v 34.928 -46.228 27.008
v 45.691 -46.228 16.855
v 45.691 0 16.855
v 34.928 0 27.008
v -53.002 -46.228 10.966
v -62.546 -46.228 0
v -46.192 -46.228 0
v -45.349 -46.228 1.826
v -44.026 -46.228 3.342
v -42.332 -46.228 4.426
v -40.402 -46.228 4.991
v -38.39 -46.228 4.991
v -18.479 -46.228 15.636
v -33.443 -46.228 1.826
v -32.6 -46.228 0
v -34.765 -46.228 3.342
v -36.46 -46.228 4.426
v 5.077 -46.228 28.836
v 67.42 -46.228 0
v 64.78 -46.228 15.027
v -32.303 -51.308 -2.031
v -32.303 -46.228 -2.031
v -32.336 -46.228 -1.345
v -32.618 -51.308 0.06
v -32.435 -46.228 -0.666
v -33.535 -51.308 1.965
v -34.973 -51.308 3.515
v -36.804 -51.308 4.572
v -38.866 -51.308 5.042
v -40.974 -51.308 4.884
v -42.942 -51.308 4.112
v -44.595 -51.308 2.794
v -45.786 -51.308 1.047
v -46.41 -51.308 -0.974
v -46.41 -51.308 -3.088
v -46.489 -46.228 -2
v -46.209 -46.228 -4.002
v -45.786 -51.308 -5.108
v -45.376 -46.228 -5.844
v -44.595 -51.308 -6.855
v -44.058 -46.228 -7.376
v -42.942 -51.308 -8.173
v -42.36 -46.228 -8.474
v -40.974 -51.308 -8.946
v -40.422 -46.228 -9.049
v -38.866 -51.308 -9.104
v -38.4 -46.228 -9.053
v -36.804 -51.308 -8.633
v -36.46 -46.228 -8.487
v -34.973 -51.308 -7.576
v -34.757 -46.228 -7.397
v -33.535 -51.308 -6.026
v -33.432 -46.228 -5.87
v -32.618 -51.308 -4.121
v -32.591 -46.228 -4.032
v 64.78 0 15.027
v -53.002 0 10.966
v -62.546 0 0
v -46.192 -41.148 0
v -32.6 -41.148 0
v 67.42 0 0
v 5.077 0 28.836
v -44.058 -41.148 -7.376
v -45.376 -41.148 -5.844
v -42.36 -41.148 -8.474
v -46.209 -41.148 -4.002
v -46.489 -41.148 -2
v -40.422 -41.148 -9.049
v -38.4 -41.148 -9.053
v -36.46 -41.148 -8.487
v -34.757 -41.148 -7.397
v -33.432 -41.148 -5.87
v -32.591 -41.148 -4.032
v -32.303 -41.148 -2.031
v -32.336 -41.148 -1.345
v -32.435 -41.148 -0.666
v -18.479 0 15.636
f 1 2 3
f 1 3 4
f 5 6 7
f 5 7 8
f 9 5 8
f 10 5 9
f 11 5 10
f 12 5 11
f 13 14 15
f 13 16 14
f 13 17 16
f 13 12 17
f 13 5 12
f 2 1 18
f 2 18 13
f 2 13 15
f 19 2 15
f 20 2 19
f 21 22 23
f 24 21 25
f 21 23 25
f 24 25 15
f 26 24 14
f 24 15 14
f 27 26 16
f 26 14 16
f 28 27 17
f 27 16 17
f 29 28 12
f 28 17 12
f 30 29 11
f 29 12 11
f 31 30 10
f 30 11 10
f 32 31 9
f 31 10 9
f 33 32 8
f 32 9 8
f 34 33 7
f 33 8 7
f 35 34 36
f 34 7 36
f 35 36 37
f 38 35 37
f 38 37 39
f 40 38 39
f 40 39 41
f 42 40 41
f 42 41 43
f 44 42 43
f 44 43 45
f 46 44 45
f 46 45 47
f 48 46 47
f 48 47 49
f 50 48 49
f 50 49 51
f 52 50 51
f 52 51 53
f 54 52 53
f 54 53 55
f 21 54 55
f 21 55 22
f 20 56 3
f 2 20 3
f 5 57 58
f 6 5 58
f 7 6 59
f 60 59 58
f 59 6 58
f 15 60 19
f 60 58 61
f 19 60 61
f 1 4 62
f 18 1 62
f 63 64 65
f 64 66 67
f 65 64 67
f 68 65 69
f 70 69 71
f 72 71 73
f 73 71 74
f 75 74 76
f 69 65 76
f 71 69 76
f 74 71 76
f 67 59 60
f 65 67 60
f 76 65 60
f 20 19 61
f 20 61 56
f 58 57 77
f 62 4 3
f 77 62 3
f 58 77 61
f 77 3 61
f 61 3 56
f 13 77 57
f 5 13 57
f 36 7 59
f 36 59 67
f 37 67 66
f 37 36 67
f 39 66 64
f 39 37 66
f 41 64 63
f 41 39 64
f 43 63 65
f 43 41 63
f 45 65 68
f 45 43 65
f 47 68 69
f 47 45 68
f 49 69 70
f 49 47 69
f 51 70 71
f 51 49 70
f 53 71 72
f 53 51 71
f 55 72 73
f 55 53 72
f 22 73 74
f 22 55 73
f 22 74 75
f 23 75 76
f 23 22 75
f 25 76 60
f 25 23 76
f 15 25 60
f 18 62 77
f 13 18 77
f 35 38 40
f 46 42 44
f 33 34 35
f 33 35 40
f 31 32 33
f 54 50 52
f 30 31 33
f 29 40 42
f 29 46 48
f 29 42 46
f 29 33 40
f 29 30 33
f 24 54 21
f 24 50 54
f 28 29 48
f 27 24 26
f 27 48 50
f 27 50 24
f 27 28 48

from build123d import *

# Parameters (mm, degrees)
F1_DEPTH      = 46.228
F2_R          = 7.092967
F3_DEPTH      = 5.08
F3_DEPTH_BACK = 5.08


with BuildPart() as f1:
    # F0 (on Front) → F1 (new body)
    with BuildSketch(Plane.XZ):
        Polygon((-53.001549, 10.965838), (-62.545888, 0), (67.419596, 0), (64.779676, 15.027259), (45.690991, 16.854899), (34.928225, 27.008452), (5.076777, 28.836092), (-18.479466, 15.636472), align=None)
    extrude(amount=F1_DEPTH)

    # F2 (on face) → F3 (join, two sides)
    with BuildSketch(Plane.XZ.offset(46.228)) as f3_sk:
        with Locations((-39.395787, -2.030711)):
            Circle(F2_R)
    extrude(amount=F3_DEPTH)
    extrude(f3_sk.sketch, amount=-F3_DEPTH_BACK)


solid = f1.part
